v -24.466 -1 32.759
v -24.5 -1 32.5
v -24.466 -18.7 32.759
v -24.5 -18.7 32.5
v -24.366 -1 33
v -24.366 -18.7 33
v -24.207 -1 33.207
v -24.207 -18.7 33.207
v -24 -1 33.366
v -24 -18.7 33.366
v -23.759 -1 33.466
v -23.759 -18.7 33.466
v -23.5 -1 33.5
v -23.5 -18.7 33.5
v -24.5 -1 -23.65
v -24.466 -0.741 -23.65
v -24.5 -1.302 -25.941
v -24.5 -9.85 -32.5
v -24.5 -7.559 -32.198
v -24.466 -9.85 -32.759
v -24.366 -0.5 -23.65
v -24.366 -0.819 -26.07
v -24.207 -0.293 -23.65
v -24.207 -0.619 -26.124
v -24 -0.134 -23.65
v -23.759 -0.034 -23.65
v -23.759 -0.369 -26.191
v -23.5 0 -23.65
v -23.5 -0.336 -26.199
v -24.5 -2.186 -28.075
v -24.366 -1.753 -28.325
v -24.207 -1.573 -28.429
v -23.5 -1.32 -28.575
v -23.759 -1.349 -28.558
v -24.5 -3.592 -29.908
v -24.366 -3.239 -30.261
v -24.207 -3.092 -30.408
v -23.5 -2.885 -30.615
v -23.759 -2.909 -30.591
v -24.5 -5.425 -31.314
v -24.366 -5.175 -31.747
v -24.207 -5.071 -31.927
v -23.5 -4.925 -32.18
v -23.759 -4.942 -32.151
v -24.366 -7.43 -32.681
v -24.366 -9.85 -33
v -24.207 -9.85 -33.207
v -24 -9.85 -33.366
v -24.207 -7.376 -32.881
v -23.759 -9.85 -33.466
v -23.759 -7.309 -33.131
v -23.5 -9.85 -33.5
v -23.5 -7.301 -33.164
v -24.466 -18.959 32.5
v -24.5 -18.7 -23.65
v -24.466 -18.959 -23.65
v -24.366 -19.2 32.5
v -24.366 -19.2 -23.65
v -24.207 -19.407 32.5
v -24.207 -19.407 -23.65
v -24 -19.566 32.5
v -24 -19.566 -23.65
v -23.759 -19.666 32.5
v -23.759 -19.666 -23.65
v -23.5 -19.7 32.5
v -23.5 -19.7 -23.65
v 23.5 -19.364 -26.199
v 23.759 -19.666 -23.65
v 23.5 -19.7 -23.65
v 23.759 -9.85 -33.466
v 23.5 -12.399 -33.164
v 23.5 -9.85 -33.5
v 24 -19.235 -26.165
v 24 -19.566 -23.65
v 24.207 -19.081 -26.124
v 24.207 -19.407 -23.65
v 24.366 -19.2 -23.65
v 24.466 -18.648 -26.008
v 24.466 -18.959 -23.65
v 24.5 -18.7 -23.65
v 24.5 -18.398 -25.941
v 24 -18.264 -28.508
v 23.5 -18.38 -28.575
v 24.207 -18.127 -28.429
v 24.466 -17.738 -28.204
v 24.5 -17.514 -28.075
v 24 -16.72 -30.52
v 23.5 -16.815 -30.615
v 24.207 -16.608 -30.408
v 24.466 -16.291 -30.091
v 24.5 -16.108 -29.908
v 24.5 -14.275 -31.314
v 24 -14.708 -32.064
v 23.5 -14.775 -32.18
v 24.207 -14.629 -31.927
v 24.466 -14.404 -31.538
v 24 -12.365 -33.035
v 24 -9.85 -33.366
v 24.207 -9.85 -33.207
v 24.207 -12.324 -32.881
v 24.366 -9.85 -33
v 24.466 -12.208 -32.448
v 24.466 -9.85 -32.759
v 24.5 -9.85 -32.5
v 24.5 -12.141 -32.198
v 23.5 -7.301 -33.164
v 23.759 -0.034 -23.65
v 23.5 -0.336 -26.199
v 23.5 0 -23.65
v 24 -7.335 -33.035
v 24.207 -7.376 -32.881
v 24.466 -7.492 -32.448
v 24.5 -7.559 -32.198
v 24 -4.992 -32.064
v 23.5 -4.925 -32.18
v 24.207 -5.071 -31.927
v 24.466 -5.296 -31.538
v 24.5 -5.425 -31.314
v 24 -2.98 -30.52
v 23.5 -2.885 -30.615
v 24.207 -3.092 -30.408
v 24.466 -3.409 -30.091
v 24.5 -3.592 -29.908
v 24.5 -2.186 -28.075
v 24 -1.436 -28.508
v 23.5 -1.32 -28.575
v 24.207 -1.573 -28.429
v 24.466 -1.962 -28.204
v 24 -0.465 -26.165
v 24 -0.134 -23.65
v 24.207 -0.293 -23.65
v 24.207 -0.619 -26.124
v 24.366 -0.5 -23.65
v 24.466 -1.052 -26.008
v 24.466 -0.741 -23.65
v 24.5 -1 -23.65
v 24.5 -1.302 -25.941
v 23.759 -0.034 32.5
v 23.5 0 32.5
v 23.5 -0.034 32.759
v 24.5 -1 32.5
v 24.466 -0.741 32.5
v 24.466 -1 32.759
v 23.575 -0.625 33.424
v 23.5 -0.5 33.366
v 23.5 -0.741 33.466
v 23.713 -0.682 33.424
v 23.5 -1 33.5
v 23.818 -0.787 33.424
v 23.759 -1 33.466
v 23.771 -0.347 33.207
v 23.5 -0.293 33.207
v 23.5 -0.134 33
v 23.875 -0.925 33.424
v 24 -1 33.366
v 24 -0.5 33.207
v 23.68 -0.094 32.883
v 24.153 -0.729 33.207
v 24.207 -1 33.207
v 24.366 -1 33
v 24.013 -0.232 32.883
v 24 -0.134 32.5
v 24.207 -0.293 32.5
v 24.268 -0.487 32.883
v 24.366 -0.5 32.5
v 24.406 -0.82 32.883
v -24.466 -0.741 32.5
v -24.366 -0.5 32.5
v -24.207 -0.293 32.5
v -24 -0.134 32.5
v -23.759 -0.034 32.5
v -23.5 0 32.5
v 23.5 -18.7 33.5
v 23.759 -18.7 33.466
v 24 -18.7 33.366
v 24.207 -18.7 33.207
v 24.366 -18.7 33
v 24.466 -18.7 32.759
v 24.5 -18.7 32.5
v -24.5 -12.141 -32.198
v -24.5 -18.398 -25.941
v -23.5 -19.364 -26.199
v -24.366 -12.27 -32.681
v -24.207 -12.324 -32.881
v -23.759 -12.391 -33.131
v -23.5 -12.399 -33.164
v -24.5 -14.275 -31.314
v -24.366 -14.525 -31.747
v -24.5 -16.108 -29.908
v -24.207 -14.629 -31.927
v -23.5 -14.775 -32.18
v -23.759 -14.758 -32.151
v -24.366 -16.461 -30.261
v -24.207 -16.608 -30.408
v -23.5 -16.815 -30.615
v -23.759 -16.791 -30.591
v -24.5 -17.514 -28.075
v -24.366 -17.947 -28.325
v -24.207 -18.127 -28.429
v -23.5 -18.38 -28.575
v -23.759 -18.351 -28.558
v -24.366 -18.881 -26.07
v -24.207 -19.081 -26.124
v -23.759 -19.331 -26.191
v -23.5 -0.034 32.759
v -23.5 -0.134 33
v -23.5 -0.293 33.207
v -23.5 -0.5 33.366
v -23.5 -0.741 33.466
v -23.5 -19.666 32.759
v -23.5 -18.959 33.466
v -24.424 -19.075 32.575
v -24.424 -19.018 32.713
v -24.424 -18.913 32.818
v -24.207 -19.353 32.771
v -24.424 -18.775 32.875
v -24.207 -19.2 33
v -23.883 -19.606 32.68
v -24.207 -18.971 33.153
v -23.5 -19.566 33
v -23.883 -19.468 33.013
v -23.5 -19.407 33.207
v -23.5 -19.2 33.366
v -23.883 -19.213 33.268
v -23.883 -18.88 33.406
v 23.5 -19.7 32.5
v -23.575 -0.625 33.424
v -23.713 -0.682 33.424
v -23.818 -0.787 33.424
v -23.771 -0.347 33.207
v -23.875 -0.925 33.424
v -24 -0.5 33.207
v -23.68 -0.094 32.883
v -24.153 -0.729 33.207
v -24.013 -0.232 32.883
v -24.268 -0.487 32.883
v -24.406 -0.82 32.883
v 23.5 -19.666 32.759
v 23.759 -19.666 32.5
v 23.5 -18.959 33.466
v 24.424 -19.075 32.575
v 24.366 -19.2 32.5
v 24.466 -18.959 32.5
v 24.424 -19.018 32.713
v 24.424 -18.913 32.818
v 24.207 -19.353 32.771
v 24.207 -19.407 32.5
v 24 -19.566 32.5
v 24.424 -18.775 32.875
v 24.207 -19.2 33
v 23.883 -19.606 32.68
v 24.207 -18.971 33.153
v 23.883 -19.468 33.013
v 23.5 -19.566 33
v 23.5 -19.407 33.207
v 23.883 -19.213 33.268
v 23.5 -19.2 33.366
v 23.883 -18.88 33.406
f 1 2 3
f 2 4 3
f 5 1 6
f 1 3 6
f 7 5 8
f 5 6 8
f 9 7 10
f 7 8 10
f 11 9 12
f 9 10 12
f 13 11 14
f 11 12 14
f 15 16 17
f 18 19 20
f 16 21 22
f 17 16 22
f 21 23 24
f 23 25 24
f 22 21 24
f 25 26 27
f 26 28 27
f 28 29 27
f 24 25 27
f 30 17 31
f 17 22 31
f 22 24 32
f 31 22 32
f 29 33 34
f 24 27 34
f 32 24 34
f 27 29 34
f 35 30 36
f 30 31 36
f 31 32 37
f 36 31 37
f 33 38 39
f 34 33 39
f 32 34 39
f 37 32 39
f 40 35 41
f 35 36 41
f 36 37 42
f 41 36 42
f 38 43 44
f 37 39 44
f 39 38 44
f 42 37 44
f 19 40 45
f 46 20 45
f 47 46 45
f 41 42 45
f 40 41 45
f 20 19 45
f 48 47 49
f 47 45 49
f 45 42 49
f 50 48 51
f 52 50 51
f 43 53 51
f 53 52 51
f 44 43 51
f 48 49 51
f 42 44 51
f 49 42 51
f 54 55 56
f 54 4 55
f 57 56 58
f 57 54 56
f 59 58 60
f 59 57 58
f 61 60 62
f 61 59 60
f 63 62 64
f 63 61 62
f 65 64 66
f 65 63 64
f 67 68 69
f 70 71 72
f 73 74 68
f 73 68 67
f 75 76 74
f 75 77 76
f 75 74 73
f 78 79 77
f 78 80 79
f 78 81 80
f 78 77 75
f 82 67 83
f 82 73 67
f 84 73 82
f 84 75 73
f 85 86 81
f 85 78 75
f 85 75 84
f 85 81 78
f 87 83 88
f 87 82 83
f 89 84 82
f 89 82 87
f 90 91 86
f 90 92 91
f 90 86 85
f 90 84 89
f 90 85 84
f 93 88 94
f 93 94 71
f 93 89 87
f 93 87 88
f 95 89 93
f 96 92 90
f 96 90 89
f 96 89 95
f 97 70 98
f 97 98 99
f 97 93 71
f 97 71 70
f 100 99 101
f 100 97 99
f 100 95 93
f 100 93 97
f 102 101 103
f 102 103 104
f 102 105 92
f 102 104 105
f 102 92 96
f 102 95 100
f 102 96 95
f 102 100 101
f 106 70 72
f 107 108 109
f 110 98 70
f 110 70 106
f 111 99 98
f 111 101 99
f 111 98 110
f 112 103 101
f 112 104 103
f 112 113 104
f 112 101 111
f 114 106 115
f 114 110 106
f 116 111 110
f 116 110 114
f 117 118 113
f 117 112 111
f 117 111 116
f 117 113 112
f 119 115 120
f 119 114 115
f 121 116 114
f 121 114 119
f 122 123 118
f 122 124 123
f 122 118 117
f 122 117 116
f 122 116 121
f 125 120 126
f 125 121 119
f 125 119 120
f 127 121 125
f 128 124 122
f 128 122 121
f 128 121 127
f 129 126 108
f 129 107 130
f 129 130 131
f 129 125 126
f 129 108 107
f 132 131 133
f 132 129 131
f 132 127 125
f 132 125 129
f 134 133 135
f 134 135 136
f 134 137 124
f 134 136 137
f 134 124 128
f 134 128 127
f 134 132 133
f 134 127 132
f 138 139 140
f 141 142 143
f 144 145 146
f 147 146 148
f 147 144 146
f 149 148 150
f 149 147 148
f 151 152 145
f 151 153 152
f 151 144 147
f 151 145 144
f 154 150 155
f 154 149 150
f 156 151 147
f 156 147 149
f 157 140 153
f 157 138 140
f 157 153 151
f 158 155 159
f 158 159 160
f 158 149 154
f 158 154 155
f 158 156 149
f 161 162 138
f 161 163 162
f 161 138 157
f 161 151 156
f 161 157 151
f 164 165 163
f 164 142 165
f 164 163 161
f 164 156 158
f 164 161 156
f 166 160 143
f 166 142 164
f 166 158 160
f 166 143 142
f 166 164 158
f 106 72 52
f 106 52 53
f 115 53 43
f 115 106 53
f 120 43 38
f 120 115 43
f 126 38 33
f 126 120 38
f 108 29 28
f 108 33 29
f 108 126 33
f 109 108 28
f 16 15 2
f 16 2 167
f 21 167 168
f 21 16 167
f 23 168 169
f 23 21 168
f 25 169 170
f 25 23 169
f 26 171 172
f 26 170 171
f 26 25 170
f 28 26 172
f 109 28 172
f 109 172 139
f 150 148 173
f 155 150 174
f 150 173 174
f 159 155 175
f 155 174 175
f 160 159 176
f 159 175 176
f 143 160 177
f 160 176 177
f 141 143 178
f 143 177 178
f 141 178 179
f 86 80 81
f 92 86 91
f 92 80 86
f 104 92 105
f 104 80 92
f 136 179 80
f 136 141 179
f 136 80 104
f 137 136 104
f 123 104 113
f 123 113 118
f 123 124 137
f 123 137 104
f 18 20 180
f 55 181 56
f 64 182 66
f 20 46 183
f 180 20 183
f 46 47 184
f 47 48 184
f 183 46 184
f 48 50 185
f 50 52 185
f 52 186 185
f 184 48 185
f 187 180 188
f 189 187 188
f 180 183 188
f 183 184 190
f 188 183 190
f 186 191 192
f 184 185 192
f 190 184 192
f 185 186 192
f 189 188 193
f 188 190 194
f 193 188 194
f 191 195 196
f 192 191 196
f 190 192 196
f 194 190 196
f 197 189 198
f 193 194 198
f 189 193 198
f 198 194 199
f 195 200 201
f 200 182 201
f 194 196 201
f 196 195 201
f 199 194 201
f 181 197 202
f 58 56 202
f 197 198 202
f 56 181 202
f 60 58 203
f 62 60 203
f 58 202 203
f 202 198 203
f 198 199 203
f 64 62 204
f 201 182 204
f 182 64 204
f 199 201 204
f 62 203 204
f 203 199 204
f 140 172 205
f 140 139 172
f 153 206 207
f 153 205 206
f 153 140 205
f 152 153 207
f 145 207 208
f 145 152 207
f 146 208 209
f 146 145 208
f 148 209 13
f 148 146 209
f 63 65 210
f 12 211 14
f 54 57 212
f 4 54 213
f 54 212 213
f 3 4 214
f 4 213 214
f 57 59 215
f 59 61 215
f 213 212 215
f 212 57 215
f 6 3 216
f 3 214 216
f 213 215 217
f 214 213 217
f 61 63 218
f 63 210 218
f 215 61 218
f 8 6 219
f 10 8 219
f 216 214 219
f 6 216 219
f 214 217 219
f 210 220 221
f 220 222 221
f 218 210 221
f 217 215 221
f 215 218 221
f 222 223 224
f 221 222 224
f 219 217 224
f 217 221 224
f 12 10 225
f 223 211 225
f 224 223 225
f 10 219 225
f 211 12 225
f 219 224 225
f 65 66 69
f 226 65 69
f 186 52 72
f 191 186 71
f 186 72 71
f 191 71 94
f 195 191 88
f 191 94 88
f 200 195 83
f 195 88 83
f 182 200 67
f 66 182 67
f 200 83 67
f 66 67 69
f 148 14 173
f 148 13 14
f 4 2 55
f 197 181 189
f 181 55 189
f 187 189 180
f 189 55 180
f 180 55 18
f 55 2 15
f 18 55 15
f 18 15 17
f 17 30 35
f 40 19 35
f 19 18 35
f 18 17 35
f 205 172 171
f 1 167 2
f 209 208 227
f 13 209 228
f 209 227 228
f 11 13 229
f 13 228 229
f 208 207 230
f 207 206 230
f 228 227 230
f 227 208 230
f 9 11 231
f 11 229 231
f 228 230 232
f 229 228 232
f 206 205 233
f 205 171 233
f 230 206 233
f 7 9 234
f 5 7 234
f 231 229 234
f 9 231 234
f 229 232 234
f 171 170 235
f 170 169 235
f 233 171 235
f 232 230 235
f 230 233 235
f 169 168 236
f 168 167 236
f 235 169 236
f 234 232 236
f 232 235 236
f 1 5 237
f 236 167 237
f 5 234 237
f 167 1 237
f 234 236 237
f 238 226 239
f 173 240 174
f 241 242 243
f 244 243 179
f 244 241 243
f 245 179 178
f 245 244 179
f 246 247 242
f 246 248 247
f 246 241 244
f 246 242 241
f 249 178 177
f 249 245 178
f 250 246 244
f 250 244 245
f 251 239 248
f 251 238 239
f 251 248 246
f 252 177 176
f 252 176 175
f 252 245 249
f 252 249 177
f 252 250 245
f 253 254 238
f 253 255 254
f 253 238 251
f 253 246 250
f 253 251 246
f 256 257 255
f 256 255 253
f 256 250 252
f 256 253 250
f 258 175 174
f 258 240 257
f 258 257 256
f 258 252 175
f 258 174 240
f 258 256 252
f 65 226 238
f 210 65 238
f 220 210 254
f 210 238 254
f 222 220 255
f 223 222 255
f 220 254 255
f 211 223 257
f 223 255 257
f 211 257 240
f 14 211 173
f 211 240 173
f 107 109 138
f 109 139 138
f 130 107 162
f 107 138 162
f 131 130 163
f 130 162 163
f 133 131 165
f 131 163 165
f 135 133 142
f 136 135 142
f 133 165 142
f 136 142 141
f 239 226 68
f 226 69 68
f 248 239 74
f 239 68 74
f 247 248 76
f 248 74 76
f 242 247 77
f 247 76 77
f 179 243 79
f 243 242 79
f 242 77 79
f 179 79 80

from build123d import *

# Parameters (mm, degrees)
SKETCH1_W           = 49
SKETCH1_H           = 67
BOSS_EXTRUDE1_DEPTH = 19.7
FILLET3_R           = 9.85
FILLET4_R           = 1


with BuildPart() as part:
    # Sketch1 → Boss-Extrude1 (new body)
    with BuildSketch(Plane(origin=(0, 0, 0), x_dir=(1, 0, 0), z_dir=(0, 1, 0))):
        Rectangle(SKETCH1_W, SKETCH1_H)
    extrude(amount=-BOSS_EXTRUDE1_DEPTH)

    # Fillet3
    fillet3_edges = [part.edges().sort_by_distance(p)[0] for p in [
        (0, -19.7, -33.5),
        (0, 0, -33.5),
    ]]
    fillet(fillet3_edges, radius=FILLET3_R - 0.0001)  # a hair under: the kernel refuses the full size

    # Fillet4
    fillet4_edges = [part.edges().sort_by_distance(p)[0] for p in [
        (0, -19.7, 33.5),
        (-24.5, 0, 4.92495),
        (-24.5, -19.7, 4.92495),
        (-24.5, -2.884968916, -30.615031084),
        (-24.5, -16.815031084, -30.615031084),
        (24.5, -2.884968916, -30.615031084),
        (24.5, -16.815031084, -30.615031084),
        (24.5, -19.7, 4.92495),
        (0, 0, 33.5),
        (24.5, 0, 4.92495),
        (24.5, -9.85, 33.5),
        (-24.5, -9.85, 33.5),
    ]]
    fillet(fillet4_edges, radius=FILLET4_R)


solid = part.part
